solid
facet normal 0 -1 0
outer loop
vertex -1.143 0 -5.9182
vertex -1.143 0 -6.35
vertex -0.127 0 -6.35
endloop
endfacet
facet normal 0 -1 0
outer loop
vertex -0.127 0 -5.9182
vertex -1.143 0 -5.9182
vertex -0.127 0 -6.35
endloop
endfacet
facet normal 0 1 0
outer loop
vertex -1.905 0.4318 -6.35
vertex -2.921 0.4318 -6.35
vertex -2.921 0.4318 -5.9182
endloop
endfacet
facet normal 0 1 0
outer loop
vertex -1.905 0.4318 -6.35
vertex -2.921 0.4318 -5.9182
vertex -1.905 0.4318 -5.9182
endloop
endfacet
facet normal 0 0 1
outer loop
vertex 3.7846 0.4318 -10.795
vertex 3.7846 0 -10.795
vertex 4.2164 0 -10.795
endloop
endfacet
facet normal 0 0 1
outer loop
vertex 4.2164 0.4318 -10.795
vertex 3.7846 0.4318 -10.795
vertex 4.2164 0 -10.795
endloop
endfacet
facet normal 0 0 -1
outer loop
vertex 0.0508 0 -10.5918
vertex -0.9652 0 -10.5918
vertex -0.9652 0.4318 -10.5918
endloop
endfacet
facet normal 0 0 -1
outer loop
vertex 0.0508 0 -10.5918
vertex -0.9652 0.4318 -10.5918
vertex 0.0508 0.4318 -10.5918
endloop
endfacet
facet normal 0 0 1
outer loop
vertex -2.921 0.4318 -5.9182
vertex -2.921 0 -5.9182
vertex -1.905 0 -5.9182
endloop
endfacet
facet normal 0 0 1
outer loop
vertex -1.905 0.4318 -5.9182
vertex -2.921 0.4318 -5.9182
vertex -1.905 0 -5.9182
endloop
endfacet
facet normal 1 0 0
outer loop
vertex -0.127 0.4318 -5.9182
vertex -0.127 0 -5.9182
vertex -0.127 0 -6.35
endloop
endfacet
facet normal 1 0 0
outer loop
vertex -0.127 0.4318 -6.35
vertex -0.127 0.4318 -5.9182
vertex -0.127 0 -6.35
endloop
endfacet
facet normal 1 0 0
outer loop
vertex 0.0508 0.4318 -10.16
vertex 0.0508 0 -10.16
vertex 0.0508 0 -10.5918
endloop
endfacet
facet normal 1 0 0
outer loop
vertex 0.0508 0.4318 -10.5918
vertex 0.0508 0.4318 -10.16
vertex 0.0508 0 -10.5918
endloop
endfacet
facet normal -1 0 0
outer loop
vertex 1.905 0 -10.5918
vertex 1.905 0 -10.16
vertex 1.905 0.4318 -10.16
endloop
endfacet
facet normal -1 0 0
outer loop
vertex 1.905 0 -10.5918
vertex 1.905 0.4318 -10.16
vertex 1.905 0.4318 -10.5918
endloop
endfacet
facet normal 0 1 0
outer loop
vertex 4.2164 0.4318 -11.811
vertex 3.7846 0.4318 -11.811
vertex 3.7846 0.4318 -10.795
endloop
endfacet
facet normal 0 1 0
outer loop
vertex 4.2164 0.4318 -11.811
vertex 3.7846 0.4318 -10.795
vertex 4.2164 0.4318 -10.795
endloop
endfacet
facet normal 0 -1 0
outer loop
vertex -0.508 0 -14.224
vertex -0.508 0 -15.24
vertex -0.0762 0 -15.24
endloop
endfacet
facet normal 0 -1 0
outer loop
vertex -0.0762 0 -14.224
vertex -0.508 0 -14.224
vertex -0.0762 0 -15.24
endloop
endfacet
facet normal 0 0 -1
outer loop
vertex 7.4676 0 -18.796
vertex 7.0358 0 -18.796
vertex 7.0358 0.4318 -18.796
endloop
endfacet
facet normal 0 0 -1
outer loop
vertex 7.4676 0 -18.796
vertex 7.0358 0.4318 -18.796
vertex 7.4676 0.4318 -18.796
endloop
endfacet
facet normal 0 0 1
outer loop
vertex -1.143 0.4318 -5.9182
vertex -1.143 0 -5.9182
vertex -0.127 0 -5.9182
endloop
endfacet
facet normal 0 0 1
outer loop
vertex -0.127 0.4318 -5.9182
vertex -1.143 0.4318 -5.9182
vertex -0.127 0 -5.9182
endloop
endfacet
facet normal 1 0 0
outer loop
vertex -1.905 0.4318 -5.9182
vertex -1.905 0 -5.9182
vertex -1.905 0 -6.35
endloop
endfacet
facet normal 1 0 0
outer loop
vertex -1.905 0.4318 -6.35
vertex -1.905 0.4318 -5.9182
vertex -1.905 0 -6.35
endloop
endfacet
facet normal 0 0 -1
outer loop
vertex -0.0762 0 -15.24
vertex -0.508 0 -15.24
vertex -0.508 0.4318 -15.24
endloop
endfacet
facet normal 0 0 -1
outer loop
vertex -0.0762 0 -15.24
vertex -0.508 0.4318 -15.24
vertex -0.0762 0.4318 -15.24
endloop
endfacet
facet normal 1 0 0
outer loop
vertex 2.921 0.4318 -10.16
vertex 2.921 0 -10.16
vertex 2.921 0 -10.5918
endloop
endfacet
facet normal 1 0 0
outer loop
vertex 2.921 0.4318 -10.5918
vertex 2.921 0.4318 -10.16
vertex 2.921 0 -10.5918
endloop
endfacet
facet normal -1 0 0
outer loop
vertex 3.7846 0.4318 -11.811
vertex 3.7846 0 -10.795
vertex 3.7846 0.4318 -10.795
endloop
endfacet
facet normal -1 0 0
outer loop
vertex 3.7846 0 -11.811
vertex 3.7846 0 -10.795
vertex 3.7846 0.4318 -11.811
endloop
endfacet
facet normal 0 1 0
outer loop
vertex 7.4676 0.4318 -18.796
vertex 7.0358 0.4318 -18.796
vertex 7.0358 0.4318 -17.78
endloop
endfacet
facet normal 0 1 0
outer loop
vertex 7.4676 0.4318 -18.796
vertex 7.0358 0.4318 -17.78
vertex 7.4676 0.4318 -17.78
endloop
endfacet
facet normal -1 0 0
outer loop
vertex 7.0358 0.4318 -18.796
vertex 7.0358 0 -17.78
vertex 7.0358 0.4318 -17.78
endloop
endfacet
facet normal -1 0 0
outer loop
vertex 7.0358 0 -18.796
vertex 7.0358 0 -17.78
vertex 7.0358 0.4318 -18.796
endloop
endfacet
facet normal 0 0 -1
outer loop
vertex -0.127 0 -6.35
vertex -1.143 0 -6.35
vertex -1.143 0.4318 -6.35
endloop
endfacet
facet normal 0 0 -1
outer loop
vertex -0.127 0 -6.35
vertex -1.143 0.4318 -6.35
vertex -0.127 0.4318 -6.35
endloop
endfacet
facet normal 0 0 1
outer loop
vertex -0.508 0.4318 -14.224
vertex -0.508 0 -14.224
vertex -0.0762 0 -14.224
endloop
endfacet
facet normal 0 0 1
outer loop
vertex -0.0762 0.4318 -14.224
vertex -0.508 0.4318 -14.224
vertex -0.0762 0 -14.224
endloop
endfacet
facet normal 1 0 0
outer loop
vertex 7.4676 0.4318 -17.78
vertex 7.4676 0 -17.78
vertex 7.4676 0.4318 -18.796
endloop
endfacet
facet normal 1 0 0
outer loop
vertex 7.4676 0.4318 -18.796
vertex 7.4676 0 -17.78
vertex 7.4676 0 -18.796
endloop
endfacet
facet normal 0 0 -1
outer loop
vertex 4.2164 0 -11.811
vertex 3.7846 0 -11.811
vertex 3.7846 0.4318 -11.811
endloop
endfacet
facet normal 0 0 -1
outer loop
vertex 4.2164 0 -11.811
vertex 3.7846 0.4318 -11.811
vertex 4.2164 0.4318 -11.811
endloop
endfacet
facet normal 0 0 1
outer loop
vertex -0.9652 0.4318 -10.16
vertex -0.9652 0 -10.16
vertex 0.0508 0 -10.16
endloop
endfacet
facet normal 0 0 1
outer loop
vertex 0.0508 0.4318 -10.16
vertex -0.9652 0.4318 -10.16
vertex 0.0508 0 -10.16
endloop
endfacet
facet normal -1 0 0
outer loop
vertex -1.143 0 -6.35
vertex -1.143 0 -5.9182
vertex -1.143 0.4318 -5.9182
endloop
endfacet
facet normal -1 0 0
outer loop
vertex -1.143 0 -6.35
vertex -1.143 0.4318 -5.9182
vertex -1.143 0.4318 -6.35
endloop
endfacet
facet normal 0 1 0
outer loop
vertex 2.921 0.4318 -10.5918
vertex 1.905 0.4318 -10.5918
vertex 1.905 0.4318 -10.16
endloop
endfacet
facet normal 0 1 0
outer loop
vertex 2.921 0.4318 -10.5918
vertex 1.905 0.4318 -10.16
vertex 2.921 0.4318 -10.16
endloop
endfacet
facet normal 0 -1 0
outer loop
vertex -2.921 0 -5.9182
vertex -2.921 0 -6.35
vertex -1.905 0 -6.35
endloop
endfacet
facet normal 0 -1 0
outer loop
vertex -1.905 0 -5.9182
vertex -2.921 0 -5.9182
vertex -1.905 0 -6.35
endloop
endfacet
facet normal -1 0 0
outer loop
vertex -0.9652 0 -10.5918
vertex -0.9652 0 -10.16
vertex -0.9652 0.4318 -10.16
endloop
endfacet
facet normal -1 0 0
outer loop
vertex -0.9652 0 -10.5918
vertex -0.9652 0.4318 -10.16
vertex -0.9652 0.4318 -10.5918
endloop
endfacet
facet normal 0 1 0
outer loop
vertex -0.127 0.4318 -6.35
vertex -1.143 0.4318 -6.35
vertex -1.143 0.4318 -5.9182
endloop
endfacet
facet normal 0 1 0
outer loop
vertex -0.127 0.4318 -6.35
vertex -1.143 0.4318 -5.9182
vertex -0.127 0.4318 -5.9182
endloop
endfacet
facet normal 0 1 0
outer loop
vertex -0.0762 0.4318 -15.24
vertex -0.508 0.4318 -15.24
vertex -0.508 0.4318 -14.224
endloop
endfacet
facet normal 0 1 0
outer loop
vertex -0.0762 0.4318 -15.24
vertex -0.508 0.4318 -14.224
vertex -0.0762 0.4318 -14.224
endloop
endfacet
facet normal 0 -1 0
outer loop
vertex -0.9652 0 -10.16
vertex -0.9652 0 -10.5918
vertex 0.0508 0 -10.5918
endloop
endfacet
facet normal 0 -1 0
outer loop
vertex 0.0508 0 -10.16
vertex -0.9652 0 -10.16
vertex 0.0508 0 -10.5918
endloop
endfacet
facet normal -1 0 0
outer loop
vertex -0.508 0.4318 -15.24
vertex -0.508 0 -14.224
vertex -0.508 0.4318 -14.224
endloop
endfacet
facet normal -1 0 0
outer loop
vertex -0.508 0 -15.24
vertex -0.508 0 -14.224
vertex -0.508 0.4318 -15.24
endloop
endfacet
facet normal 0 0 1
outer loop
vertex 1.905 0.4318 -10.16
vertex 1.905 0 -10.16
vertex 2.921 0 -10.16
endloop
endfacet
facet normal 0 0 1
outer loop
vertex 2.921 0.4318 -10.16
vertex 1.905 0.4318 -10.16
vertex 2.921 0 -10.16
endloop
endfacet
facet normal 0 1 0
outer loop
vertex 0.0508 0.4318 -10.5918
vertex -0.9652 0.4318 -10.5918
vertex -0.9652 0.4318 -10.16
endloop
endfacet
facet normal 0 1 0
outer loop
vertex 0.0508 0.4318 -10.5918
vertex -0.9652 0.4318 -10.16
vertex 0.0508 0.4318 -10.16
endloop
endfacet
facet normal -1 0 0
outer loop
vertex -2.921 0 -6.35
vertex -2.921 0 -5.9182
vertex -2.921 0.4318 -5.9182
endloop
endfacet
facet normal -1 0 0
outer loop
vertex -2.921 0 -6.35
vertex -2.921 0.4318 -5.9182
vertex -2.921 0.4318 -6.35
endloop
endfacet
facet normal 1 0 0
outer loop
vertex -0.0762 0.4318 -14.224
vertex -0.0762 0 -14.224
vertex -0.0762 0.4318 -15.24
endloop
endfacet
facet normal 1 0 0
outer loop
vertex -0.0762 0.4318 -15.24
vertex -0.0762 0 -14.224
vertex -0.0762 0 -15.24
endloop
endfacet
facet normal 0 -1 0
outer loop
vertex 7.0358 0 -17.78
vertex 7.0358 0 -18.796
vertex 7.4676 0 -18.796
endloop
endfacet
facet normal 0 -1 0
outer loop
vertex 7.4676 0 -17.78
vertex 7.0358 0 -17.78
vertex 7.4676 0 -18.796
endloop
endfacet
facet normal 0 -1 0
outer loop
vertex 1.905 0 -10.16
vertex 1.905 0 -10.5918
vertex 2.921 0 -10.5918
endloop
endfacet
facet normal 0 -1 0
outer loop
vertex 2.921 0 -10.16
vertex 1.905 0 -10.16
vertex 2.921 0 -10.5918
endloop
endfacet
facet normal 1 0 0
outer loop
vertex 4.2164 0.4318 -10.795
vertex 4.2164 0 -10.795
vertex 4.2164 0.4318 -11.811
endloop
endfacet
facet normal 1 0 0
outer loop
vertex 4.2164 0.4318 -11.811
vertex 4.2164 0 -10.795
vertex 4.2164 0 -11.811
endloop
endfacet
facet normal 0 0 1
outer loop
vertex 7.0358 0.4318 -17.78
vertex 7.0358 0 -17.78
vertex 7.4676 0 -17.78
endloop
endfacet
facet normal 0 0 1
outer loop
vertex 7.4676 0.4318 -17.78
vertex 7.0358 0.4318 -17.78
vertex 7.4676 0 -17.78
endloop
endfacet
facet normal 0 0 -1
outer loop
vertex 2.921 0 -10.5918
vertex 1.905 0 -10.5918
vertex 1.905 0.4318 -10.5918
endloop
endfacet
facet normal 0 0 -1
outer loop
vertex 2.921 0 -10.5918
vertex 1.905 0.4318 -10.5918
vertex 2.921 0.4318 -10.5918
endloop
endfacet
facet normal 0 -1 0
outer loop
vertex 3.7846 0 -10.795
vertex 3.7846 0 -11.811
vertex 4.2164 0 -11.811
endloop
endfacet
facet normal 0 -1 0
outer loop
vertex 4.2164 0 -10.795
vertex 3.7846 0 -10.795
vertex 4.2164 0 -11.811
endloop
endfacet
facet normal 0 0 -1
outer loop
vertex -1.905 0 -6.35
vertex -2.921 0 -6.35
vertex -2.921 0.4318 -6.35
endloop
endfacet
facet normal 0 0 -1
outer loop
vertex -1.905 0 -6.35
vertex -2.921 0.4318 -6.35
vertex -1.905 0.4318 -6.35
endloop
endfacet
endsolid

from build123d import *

# Parameters (mm, degrees)
SKETCH1_W             = 1.016
SKETCH1_H             = 0.4318
BOSS_EXTRUDE1_DEPTH   = 0.4318
SKETCH1_W_2           = 0.4318
SKETCH1_H_2           = 1.016
BOSS_EXTRUDE1_2_DEPTH = 0.4318
BOSS_EXTRUDE1_3_DEPTH = 0.4318
BOSS_EXTRUDE1_4_DEPTH = 0.4318
BOSS_EXTRUDE1_5_DEPTH = 0.4318
BOSS_EXTRUDE1_6_DEPTH = 0.4318
BOSS_EXTRUDE1_7_DEPTH = 0.4318


with BuildPart() as part:
    # Sketch1 → Boss-Extrude1 (new body)
    with BuildSketch(Plane(origin=(0, 0, 0), x_dir=(1, 0, 0), z_dir=(0, 1, 0))):
        with Locations((-0.635, 6.1341)):
            Rectangle(SKETCH1_W, SKETCH1_H)
    extrude(amount=BOSS_EXTRUDE1_DEPTH)


with BuildPart() as body_2:
    # Sketch1 → Boss-Extrude1 2 (new body)
    with BuildSketch(Plane(origin=(0, 0, 0), x_dir=(1, 0, 0), z_dir=(0, 1, 0))):
        with Locations((-0.2921, 14.732)):
            Rectangle(SKETCH1_W_2, SKETCH1_H_2)
    extrude(amount=BOSS_EXTRUDE1_2_DEPTH)


with BuildPart() as body_3:
    # Sketch1 → Boss-Extrude1 3 (new body)
    with BuildSketch(Plane(origin=(0, 0, 0), x_dir=(1, 0, 0), z_dir=(0, 1, 0))):
        with Locations((7.2517, 18.288)):
            Rectangle(SKETCH1_W_2, SKETCH1_H_2)
    extrude(amount=BOSS_EXTRUDE1_3_DEPTH)


with BuildPart() as body_4:
    # Sketch1 → Boss-Extrude1 4 (new body)
    with BuildSketch(Plane(origin=(0, 0, 0), x_dir=(1, 0, 0), z_dir=(0, 1, 0))):
        with Locations((-2.413, 6.1341)):
            Rectangle(SKETCH1_W, SKETCH1_H)
    extrude(amount=BOSS_EXTRUDE1_4_DEPTH)


with BuildPart() as body_5:
    # Sketch1 → Boss-Extrude1 5 (new body)
    with BuildSketch(Plane(origin=(0, 0, 0), x_dir=(1, 0, 0), z_dir=(0, 1, 0))):
        with Locations((-0.4572, 10.3759)):
            Rectangle(SKETCH1_W, SKETCH1_H)
    extrude(amount=BOSS_EXTRUDE1_5_DEPTH)


with BuildPart() as body_6:
    # Sketch1 → Boss-Extrude1 6 (new body)
    with BuildSketch(Plane(origin=(0, 0, 0), x_dir=(1, 0, 0), z_dir=(0, 1, 0))):
        with Locations((2.413, 10.3759)):
            Rectangle(SKETCH1_W, SKETCH1_H)
    extrude(amount=BOSS_EXTRUDE1_6_DEPTH)


with BuildPart() as body_7:
    # Sketch1 → Boss-Extrude1 7 (new body)
    with BuildSketch(Plane(origin=(0, 0, 0), x_dir=(1, 0, 0), z_dir=(0, 1, 0))):
        with Locations((4.0005, 11.303)):
            Rectangle(SKETCH1_W_2, SKETCH1_H_2)
    extrude(amount=BOSS_EXTRUDE1_7_DEPTH)


solid = Compound([part.part, body_2.part, body_3.part, body_4.part, body_5.part, body_6.part, body_7.part])
